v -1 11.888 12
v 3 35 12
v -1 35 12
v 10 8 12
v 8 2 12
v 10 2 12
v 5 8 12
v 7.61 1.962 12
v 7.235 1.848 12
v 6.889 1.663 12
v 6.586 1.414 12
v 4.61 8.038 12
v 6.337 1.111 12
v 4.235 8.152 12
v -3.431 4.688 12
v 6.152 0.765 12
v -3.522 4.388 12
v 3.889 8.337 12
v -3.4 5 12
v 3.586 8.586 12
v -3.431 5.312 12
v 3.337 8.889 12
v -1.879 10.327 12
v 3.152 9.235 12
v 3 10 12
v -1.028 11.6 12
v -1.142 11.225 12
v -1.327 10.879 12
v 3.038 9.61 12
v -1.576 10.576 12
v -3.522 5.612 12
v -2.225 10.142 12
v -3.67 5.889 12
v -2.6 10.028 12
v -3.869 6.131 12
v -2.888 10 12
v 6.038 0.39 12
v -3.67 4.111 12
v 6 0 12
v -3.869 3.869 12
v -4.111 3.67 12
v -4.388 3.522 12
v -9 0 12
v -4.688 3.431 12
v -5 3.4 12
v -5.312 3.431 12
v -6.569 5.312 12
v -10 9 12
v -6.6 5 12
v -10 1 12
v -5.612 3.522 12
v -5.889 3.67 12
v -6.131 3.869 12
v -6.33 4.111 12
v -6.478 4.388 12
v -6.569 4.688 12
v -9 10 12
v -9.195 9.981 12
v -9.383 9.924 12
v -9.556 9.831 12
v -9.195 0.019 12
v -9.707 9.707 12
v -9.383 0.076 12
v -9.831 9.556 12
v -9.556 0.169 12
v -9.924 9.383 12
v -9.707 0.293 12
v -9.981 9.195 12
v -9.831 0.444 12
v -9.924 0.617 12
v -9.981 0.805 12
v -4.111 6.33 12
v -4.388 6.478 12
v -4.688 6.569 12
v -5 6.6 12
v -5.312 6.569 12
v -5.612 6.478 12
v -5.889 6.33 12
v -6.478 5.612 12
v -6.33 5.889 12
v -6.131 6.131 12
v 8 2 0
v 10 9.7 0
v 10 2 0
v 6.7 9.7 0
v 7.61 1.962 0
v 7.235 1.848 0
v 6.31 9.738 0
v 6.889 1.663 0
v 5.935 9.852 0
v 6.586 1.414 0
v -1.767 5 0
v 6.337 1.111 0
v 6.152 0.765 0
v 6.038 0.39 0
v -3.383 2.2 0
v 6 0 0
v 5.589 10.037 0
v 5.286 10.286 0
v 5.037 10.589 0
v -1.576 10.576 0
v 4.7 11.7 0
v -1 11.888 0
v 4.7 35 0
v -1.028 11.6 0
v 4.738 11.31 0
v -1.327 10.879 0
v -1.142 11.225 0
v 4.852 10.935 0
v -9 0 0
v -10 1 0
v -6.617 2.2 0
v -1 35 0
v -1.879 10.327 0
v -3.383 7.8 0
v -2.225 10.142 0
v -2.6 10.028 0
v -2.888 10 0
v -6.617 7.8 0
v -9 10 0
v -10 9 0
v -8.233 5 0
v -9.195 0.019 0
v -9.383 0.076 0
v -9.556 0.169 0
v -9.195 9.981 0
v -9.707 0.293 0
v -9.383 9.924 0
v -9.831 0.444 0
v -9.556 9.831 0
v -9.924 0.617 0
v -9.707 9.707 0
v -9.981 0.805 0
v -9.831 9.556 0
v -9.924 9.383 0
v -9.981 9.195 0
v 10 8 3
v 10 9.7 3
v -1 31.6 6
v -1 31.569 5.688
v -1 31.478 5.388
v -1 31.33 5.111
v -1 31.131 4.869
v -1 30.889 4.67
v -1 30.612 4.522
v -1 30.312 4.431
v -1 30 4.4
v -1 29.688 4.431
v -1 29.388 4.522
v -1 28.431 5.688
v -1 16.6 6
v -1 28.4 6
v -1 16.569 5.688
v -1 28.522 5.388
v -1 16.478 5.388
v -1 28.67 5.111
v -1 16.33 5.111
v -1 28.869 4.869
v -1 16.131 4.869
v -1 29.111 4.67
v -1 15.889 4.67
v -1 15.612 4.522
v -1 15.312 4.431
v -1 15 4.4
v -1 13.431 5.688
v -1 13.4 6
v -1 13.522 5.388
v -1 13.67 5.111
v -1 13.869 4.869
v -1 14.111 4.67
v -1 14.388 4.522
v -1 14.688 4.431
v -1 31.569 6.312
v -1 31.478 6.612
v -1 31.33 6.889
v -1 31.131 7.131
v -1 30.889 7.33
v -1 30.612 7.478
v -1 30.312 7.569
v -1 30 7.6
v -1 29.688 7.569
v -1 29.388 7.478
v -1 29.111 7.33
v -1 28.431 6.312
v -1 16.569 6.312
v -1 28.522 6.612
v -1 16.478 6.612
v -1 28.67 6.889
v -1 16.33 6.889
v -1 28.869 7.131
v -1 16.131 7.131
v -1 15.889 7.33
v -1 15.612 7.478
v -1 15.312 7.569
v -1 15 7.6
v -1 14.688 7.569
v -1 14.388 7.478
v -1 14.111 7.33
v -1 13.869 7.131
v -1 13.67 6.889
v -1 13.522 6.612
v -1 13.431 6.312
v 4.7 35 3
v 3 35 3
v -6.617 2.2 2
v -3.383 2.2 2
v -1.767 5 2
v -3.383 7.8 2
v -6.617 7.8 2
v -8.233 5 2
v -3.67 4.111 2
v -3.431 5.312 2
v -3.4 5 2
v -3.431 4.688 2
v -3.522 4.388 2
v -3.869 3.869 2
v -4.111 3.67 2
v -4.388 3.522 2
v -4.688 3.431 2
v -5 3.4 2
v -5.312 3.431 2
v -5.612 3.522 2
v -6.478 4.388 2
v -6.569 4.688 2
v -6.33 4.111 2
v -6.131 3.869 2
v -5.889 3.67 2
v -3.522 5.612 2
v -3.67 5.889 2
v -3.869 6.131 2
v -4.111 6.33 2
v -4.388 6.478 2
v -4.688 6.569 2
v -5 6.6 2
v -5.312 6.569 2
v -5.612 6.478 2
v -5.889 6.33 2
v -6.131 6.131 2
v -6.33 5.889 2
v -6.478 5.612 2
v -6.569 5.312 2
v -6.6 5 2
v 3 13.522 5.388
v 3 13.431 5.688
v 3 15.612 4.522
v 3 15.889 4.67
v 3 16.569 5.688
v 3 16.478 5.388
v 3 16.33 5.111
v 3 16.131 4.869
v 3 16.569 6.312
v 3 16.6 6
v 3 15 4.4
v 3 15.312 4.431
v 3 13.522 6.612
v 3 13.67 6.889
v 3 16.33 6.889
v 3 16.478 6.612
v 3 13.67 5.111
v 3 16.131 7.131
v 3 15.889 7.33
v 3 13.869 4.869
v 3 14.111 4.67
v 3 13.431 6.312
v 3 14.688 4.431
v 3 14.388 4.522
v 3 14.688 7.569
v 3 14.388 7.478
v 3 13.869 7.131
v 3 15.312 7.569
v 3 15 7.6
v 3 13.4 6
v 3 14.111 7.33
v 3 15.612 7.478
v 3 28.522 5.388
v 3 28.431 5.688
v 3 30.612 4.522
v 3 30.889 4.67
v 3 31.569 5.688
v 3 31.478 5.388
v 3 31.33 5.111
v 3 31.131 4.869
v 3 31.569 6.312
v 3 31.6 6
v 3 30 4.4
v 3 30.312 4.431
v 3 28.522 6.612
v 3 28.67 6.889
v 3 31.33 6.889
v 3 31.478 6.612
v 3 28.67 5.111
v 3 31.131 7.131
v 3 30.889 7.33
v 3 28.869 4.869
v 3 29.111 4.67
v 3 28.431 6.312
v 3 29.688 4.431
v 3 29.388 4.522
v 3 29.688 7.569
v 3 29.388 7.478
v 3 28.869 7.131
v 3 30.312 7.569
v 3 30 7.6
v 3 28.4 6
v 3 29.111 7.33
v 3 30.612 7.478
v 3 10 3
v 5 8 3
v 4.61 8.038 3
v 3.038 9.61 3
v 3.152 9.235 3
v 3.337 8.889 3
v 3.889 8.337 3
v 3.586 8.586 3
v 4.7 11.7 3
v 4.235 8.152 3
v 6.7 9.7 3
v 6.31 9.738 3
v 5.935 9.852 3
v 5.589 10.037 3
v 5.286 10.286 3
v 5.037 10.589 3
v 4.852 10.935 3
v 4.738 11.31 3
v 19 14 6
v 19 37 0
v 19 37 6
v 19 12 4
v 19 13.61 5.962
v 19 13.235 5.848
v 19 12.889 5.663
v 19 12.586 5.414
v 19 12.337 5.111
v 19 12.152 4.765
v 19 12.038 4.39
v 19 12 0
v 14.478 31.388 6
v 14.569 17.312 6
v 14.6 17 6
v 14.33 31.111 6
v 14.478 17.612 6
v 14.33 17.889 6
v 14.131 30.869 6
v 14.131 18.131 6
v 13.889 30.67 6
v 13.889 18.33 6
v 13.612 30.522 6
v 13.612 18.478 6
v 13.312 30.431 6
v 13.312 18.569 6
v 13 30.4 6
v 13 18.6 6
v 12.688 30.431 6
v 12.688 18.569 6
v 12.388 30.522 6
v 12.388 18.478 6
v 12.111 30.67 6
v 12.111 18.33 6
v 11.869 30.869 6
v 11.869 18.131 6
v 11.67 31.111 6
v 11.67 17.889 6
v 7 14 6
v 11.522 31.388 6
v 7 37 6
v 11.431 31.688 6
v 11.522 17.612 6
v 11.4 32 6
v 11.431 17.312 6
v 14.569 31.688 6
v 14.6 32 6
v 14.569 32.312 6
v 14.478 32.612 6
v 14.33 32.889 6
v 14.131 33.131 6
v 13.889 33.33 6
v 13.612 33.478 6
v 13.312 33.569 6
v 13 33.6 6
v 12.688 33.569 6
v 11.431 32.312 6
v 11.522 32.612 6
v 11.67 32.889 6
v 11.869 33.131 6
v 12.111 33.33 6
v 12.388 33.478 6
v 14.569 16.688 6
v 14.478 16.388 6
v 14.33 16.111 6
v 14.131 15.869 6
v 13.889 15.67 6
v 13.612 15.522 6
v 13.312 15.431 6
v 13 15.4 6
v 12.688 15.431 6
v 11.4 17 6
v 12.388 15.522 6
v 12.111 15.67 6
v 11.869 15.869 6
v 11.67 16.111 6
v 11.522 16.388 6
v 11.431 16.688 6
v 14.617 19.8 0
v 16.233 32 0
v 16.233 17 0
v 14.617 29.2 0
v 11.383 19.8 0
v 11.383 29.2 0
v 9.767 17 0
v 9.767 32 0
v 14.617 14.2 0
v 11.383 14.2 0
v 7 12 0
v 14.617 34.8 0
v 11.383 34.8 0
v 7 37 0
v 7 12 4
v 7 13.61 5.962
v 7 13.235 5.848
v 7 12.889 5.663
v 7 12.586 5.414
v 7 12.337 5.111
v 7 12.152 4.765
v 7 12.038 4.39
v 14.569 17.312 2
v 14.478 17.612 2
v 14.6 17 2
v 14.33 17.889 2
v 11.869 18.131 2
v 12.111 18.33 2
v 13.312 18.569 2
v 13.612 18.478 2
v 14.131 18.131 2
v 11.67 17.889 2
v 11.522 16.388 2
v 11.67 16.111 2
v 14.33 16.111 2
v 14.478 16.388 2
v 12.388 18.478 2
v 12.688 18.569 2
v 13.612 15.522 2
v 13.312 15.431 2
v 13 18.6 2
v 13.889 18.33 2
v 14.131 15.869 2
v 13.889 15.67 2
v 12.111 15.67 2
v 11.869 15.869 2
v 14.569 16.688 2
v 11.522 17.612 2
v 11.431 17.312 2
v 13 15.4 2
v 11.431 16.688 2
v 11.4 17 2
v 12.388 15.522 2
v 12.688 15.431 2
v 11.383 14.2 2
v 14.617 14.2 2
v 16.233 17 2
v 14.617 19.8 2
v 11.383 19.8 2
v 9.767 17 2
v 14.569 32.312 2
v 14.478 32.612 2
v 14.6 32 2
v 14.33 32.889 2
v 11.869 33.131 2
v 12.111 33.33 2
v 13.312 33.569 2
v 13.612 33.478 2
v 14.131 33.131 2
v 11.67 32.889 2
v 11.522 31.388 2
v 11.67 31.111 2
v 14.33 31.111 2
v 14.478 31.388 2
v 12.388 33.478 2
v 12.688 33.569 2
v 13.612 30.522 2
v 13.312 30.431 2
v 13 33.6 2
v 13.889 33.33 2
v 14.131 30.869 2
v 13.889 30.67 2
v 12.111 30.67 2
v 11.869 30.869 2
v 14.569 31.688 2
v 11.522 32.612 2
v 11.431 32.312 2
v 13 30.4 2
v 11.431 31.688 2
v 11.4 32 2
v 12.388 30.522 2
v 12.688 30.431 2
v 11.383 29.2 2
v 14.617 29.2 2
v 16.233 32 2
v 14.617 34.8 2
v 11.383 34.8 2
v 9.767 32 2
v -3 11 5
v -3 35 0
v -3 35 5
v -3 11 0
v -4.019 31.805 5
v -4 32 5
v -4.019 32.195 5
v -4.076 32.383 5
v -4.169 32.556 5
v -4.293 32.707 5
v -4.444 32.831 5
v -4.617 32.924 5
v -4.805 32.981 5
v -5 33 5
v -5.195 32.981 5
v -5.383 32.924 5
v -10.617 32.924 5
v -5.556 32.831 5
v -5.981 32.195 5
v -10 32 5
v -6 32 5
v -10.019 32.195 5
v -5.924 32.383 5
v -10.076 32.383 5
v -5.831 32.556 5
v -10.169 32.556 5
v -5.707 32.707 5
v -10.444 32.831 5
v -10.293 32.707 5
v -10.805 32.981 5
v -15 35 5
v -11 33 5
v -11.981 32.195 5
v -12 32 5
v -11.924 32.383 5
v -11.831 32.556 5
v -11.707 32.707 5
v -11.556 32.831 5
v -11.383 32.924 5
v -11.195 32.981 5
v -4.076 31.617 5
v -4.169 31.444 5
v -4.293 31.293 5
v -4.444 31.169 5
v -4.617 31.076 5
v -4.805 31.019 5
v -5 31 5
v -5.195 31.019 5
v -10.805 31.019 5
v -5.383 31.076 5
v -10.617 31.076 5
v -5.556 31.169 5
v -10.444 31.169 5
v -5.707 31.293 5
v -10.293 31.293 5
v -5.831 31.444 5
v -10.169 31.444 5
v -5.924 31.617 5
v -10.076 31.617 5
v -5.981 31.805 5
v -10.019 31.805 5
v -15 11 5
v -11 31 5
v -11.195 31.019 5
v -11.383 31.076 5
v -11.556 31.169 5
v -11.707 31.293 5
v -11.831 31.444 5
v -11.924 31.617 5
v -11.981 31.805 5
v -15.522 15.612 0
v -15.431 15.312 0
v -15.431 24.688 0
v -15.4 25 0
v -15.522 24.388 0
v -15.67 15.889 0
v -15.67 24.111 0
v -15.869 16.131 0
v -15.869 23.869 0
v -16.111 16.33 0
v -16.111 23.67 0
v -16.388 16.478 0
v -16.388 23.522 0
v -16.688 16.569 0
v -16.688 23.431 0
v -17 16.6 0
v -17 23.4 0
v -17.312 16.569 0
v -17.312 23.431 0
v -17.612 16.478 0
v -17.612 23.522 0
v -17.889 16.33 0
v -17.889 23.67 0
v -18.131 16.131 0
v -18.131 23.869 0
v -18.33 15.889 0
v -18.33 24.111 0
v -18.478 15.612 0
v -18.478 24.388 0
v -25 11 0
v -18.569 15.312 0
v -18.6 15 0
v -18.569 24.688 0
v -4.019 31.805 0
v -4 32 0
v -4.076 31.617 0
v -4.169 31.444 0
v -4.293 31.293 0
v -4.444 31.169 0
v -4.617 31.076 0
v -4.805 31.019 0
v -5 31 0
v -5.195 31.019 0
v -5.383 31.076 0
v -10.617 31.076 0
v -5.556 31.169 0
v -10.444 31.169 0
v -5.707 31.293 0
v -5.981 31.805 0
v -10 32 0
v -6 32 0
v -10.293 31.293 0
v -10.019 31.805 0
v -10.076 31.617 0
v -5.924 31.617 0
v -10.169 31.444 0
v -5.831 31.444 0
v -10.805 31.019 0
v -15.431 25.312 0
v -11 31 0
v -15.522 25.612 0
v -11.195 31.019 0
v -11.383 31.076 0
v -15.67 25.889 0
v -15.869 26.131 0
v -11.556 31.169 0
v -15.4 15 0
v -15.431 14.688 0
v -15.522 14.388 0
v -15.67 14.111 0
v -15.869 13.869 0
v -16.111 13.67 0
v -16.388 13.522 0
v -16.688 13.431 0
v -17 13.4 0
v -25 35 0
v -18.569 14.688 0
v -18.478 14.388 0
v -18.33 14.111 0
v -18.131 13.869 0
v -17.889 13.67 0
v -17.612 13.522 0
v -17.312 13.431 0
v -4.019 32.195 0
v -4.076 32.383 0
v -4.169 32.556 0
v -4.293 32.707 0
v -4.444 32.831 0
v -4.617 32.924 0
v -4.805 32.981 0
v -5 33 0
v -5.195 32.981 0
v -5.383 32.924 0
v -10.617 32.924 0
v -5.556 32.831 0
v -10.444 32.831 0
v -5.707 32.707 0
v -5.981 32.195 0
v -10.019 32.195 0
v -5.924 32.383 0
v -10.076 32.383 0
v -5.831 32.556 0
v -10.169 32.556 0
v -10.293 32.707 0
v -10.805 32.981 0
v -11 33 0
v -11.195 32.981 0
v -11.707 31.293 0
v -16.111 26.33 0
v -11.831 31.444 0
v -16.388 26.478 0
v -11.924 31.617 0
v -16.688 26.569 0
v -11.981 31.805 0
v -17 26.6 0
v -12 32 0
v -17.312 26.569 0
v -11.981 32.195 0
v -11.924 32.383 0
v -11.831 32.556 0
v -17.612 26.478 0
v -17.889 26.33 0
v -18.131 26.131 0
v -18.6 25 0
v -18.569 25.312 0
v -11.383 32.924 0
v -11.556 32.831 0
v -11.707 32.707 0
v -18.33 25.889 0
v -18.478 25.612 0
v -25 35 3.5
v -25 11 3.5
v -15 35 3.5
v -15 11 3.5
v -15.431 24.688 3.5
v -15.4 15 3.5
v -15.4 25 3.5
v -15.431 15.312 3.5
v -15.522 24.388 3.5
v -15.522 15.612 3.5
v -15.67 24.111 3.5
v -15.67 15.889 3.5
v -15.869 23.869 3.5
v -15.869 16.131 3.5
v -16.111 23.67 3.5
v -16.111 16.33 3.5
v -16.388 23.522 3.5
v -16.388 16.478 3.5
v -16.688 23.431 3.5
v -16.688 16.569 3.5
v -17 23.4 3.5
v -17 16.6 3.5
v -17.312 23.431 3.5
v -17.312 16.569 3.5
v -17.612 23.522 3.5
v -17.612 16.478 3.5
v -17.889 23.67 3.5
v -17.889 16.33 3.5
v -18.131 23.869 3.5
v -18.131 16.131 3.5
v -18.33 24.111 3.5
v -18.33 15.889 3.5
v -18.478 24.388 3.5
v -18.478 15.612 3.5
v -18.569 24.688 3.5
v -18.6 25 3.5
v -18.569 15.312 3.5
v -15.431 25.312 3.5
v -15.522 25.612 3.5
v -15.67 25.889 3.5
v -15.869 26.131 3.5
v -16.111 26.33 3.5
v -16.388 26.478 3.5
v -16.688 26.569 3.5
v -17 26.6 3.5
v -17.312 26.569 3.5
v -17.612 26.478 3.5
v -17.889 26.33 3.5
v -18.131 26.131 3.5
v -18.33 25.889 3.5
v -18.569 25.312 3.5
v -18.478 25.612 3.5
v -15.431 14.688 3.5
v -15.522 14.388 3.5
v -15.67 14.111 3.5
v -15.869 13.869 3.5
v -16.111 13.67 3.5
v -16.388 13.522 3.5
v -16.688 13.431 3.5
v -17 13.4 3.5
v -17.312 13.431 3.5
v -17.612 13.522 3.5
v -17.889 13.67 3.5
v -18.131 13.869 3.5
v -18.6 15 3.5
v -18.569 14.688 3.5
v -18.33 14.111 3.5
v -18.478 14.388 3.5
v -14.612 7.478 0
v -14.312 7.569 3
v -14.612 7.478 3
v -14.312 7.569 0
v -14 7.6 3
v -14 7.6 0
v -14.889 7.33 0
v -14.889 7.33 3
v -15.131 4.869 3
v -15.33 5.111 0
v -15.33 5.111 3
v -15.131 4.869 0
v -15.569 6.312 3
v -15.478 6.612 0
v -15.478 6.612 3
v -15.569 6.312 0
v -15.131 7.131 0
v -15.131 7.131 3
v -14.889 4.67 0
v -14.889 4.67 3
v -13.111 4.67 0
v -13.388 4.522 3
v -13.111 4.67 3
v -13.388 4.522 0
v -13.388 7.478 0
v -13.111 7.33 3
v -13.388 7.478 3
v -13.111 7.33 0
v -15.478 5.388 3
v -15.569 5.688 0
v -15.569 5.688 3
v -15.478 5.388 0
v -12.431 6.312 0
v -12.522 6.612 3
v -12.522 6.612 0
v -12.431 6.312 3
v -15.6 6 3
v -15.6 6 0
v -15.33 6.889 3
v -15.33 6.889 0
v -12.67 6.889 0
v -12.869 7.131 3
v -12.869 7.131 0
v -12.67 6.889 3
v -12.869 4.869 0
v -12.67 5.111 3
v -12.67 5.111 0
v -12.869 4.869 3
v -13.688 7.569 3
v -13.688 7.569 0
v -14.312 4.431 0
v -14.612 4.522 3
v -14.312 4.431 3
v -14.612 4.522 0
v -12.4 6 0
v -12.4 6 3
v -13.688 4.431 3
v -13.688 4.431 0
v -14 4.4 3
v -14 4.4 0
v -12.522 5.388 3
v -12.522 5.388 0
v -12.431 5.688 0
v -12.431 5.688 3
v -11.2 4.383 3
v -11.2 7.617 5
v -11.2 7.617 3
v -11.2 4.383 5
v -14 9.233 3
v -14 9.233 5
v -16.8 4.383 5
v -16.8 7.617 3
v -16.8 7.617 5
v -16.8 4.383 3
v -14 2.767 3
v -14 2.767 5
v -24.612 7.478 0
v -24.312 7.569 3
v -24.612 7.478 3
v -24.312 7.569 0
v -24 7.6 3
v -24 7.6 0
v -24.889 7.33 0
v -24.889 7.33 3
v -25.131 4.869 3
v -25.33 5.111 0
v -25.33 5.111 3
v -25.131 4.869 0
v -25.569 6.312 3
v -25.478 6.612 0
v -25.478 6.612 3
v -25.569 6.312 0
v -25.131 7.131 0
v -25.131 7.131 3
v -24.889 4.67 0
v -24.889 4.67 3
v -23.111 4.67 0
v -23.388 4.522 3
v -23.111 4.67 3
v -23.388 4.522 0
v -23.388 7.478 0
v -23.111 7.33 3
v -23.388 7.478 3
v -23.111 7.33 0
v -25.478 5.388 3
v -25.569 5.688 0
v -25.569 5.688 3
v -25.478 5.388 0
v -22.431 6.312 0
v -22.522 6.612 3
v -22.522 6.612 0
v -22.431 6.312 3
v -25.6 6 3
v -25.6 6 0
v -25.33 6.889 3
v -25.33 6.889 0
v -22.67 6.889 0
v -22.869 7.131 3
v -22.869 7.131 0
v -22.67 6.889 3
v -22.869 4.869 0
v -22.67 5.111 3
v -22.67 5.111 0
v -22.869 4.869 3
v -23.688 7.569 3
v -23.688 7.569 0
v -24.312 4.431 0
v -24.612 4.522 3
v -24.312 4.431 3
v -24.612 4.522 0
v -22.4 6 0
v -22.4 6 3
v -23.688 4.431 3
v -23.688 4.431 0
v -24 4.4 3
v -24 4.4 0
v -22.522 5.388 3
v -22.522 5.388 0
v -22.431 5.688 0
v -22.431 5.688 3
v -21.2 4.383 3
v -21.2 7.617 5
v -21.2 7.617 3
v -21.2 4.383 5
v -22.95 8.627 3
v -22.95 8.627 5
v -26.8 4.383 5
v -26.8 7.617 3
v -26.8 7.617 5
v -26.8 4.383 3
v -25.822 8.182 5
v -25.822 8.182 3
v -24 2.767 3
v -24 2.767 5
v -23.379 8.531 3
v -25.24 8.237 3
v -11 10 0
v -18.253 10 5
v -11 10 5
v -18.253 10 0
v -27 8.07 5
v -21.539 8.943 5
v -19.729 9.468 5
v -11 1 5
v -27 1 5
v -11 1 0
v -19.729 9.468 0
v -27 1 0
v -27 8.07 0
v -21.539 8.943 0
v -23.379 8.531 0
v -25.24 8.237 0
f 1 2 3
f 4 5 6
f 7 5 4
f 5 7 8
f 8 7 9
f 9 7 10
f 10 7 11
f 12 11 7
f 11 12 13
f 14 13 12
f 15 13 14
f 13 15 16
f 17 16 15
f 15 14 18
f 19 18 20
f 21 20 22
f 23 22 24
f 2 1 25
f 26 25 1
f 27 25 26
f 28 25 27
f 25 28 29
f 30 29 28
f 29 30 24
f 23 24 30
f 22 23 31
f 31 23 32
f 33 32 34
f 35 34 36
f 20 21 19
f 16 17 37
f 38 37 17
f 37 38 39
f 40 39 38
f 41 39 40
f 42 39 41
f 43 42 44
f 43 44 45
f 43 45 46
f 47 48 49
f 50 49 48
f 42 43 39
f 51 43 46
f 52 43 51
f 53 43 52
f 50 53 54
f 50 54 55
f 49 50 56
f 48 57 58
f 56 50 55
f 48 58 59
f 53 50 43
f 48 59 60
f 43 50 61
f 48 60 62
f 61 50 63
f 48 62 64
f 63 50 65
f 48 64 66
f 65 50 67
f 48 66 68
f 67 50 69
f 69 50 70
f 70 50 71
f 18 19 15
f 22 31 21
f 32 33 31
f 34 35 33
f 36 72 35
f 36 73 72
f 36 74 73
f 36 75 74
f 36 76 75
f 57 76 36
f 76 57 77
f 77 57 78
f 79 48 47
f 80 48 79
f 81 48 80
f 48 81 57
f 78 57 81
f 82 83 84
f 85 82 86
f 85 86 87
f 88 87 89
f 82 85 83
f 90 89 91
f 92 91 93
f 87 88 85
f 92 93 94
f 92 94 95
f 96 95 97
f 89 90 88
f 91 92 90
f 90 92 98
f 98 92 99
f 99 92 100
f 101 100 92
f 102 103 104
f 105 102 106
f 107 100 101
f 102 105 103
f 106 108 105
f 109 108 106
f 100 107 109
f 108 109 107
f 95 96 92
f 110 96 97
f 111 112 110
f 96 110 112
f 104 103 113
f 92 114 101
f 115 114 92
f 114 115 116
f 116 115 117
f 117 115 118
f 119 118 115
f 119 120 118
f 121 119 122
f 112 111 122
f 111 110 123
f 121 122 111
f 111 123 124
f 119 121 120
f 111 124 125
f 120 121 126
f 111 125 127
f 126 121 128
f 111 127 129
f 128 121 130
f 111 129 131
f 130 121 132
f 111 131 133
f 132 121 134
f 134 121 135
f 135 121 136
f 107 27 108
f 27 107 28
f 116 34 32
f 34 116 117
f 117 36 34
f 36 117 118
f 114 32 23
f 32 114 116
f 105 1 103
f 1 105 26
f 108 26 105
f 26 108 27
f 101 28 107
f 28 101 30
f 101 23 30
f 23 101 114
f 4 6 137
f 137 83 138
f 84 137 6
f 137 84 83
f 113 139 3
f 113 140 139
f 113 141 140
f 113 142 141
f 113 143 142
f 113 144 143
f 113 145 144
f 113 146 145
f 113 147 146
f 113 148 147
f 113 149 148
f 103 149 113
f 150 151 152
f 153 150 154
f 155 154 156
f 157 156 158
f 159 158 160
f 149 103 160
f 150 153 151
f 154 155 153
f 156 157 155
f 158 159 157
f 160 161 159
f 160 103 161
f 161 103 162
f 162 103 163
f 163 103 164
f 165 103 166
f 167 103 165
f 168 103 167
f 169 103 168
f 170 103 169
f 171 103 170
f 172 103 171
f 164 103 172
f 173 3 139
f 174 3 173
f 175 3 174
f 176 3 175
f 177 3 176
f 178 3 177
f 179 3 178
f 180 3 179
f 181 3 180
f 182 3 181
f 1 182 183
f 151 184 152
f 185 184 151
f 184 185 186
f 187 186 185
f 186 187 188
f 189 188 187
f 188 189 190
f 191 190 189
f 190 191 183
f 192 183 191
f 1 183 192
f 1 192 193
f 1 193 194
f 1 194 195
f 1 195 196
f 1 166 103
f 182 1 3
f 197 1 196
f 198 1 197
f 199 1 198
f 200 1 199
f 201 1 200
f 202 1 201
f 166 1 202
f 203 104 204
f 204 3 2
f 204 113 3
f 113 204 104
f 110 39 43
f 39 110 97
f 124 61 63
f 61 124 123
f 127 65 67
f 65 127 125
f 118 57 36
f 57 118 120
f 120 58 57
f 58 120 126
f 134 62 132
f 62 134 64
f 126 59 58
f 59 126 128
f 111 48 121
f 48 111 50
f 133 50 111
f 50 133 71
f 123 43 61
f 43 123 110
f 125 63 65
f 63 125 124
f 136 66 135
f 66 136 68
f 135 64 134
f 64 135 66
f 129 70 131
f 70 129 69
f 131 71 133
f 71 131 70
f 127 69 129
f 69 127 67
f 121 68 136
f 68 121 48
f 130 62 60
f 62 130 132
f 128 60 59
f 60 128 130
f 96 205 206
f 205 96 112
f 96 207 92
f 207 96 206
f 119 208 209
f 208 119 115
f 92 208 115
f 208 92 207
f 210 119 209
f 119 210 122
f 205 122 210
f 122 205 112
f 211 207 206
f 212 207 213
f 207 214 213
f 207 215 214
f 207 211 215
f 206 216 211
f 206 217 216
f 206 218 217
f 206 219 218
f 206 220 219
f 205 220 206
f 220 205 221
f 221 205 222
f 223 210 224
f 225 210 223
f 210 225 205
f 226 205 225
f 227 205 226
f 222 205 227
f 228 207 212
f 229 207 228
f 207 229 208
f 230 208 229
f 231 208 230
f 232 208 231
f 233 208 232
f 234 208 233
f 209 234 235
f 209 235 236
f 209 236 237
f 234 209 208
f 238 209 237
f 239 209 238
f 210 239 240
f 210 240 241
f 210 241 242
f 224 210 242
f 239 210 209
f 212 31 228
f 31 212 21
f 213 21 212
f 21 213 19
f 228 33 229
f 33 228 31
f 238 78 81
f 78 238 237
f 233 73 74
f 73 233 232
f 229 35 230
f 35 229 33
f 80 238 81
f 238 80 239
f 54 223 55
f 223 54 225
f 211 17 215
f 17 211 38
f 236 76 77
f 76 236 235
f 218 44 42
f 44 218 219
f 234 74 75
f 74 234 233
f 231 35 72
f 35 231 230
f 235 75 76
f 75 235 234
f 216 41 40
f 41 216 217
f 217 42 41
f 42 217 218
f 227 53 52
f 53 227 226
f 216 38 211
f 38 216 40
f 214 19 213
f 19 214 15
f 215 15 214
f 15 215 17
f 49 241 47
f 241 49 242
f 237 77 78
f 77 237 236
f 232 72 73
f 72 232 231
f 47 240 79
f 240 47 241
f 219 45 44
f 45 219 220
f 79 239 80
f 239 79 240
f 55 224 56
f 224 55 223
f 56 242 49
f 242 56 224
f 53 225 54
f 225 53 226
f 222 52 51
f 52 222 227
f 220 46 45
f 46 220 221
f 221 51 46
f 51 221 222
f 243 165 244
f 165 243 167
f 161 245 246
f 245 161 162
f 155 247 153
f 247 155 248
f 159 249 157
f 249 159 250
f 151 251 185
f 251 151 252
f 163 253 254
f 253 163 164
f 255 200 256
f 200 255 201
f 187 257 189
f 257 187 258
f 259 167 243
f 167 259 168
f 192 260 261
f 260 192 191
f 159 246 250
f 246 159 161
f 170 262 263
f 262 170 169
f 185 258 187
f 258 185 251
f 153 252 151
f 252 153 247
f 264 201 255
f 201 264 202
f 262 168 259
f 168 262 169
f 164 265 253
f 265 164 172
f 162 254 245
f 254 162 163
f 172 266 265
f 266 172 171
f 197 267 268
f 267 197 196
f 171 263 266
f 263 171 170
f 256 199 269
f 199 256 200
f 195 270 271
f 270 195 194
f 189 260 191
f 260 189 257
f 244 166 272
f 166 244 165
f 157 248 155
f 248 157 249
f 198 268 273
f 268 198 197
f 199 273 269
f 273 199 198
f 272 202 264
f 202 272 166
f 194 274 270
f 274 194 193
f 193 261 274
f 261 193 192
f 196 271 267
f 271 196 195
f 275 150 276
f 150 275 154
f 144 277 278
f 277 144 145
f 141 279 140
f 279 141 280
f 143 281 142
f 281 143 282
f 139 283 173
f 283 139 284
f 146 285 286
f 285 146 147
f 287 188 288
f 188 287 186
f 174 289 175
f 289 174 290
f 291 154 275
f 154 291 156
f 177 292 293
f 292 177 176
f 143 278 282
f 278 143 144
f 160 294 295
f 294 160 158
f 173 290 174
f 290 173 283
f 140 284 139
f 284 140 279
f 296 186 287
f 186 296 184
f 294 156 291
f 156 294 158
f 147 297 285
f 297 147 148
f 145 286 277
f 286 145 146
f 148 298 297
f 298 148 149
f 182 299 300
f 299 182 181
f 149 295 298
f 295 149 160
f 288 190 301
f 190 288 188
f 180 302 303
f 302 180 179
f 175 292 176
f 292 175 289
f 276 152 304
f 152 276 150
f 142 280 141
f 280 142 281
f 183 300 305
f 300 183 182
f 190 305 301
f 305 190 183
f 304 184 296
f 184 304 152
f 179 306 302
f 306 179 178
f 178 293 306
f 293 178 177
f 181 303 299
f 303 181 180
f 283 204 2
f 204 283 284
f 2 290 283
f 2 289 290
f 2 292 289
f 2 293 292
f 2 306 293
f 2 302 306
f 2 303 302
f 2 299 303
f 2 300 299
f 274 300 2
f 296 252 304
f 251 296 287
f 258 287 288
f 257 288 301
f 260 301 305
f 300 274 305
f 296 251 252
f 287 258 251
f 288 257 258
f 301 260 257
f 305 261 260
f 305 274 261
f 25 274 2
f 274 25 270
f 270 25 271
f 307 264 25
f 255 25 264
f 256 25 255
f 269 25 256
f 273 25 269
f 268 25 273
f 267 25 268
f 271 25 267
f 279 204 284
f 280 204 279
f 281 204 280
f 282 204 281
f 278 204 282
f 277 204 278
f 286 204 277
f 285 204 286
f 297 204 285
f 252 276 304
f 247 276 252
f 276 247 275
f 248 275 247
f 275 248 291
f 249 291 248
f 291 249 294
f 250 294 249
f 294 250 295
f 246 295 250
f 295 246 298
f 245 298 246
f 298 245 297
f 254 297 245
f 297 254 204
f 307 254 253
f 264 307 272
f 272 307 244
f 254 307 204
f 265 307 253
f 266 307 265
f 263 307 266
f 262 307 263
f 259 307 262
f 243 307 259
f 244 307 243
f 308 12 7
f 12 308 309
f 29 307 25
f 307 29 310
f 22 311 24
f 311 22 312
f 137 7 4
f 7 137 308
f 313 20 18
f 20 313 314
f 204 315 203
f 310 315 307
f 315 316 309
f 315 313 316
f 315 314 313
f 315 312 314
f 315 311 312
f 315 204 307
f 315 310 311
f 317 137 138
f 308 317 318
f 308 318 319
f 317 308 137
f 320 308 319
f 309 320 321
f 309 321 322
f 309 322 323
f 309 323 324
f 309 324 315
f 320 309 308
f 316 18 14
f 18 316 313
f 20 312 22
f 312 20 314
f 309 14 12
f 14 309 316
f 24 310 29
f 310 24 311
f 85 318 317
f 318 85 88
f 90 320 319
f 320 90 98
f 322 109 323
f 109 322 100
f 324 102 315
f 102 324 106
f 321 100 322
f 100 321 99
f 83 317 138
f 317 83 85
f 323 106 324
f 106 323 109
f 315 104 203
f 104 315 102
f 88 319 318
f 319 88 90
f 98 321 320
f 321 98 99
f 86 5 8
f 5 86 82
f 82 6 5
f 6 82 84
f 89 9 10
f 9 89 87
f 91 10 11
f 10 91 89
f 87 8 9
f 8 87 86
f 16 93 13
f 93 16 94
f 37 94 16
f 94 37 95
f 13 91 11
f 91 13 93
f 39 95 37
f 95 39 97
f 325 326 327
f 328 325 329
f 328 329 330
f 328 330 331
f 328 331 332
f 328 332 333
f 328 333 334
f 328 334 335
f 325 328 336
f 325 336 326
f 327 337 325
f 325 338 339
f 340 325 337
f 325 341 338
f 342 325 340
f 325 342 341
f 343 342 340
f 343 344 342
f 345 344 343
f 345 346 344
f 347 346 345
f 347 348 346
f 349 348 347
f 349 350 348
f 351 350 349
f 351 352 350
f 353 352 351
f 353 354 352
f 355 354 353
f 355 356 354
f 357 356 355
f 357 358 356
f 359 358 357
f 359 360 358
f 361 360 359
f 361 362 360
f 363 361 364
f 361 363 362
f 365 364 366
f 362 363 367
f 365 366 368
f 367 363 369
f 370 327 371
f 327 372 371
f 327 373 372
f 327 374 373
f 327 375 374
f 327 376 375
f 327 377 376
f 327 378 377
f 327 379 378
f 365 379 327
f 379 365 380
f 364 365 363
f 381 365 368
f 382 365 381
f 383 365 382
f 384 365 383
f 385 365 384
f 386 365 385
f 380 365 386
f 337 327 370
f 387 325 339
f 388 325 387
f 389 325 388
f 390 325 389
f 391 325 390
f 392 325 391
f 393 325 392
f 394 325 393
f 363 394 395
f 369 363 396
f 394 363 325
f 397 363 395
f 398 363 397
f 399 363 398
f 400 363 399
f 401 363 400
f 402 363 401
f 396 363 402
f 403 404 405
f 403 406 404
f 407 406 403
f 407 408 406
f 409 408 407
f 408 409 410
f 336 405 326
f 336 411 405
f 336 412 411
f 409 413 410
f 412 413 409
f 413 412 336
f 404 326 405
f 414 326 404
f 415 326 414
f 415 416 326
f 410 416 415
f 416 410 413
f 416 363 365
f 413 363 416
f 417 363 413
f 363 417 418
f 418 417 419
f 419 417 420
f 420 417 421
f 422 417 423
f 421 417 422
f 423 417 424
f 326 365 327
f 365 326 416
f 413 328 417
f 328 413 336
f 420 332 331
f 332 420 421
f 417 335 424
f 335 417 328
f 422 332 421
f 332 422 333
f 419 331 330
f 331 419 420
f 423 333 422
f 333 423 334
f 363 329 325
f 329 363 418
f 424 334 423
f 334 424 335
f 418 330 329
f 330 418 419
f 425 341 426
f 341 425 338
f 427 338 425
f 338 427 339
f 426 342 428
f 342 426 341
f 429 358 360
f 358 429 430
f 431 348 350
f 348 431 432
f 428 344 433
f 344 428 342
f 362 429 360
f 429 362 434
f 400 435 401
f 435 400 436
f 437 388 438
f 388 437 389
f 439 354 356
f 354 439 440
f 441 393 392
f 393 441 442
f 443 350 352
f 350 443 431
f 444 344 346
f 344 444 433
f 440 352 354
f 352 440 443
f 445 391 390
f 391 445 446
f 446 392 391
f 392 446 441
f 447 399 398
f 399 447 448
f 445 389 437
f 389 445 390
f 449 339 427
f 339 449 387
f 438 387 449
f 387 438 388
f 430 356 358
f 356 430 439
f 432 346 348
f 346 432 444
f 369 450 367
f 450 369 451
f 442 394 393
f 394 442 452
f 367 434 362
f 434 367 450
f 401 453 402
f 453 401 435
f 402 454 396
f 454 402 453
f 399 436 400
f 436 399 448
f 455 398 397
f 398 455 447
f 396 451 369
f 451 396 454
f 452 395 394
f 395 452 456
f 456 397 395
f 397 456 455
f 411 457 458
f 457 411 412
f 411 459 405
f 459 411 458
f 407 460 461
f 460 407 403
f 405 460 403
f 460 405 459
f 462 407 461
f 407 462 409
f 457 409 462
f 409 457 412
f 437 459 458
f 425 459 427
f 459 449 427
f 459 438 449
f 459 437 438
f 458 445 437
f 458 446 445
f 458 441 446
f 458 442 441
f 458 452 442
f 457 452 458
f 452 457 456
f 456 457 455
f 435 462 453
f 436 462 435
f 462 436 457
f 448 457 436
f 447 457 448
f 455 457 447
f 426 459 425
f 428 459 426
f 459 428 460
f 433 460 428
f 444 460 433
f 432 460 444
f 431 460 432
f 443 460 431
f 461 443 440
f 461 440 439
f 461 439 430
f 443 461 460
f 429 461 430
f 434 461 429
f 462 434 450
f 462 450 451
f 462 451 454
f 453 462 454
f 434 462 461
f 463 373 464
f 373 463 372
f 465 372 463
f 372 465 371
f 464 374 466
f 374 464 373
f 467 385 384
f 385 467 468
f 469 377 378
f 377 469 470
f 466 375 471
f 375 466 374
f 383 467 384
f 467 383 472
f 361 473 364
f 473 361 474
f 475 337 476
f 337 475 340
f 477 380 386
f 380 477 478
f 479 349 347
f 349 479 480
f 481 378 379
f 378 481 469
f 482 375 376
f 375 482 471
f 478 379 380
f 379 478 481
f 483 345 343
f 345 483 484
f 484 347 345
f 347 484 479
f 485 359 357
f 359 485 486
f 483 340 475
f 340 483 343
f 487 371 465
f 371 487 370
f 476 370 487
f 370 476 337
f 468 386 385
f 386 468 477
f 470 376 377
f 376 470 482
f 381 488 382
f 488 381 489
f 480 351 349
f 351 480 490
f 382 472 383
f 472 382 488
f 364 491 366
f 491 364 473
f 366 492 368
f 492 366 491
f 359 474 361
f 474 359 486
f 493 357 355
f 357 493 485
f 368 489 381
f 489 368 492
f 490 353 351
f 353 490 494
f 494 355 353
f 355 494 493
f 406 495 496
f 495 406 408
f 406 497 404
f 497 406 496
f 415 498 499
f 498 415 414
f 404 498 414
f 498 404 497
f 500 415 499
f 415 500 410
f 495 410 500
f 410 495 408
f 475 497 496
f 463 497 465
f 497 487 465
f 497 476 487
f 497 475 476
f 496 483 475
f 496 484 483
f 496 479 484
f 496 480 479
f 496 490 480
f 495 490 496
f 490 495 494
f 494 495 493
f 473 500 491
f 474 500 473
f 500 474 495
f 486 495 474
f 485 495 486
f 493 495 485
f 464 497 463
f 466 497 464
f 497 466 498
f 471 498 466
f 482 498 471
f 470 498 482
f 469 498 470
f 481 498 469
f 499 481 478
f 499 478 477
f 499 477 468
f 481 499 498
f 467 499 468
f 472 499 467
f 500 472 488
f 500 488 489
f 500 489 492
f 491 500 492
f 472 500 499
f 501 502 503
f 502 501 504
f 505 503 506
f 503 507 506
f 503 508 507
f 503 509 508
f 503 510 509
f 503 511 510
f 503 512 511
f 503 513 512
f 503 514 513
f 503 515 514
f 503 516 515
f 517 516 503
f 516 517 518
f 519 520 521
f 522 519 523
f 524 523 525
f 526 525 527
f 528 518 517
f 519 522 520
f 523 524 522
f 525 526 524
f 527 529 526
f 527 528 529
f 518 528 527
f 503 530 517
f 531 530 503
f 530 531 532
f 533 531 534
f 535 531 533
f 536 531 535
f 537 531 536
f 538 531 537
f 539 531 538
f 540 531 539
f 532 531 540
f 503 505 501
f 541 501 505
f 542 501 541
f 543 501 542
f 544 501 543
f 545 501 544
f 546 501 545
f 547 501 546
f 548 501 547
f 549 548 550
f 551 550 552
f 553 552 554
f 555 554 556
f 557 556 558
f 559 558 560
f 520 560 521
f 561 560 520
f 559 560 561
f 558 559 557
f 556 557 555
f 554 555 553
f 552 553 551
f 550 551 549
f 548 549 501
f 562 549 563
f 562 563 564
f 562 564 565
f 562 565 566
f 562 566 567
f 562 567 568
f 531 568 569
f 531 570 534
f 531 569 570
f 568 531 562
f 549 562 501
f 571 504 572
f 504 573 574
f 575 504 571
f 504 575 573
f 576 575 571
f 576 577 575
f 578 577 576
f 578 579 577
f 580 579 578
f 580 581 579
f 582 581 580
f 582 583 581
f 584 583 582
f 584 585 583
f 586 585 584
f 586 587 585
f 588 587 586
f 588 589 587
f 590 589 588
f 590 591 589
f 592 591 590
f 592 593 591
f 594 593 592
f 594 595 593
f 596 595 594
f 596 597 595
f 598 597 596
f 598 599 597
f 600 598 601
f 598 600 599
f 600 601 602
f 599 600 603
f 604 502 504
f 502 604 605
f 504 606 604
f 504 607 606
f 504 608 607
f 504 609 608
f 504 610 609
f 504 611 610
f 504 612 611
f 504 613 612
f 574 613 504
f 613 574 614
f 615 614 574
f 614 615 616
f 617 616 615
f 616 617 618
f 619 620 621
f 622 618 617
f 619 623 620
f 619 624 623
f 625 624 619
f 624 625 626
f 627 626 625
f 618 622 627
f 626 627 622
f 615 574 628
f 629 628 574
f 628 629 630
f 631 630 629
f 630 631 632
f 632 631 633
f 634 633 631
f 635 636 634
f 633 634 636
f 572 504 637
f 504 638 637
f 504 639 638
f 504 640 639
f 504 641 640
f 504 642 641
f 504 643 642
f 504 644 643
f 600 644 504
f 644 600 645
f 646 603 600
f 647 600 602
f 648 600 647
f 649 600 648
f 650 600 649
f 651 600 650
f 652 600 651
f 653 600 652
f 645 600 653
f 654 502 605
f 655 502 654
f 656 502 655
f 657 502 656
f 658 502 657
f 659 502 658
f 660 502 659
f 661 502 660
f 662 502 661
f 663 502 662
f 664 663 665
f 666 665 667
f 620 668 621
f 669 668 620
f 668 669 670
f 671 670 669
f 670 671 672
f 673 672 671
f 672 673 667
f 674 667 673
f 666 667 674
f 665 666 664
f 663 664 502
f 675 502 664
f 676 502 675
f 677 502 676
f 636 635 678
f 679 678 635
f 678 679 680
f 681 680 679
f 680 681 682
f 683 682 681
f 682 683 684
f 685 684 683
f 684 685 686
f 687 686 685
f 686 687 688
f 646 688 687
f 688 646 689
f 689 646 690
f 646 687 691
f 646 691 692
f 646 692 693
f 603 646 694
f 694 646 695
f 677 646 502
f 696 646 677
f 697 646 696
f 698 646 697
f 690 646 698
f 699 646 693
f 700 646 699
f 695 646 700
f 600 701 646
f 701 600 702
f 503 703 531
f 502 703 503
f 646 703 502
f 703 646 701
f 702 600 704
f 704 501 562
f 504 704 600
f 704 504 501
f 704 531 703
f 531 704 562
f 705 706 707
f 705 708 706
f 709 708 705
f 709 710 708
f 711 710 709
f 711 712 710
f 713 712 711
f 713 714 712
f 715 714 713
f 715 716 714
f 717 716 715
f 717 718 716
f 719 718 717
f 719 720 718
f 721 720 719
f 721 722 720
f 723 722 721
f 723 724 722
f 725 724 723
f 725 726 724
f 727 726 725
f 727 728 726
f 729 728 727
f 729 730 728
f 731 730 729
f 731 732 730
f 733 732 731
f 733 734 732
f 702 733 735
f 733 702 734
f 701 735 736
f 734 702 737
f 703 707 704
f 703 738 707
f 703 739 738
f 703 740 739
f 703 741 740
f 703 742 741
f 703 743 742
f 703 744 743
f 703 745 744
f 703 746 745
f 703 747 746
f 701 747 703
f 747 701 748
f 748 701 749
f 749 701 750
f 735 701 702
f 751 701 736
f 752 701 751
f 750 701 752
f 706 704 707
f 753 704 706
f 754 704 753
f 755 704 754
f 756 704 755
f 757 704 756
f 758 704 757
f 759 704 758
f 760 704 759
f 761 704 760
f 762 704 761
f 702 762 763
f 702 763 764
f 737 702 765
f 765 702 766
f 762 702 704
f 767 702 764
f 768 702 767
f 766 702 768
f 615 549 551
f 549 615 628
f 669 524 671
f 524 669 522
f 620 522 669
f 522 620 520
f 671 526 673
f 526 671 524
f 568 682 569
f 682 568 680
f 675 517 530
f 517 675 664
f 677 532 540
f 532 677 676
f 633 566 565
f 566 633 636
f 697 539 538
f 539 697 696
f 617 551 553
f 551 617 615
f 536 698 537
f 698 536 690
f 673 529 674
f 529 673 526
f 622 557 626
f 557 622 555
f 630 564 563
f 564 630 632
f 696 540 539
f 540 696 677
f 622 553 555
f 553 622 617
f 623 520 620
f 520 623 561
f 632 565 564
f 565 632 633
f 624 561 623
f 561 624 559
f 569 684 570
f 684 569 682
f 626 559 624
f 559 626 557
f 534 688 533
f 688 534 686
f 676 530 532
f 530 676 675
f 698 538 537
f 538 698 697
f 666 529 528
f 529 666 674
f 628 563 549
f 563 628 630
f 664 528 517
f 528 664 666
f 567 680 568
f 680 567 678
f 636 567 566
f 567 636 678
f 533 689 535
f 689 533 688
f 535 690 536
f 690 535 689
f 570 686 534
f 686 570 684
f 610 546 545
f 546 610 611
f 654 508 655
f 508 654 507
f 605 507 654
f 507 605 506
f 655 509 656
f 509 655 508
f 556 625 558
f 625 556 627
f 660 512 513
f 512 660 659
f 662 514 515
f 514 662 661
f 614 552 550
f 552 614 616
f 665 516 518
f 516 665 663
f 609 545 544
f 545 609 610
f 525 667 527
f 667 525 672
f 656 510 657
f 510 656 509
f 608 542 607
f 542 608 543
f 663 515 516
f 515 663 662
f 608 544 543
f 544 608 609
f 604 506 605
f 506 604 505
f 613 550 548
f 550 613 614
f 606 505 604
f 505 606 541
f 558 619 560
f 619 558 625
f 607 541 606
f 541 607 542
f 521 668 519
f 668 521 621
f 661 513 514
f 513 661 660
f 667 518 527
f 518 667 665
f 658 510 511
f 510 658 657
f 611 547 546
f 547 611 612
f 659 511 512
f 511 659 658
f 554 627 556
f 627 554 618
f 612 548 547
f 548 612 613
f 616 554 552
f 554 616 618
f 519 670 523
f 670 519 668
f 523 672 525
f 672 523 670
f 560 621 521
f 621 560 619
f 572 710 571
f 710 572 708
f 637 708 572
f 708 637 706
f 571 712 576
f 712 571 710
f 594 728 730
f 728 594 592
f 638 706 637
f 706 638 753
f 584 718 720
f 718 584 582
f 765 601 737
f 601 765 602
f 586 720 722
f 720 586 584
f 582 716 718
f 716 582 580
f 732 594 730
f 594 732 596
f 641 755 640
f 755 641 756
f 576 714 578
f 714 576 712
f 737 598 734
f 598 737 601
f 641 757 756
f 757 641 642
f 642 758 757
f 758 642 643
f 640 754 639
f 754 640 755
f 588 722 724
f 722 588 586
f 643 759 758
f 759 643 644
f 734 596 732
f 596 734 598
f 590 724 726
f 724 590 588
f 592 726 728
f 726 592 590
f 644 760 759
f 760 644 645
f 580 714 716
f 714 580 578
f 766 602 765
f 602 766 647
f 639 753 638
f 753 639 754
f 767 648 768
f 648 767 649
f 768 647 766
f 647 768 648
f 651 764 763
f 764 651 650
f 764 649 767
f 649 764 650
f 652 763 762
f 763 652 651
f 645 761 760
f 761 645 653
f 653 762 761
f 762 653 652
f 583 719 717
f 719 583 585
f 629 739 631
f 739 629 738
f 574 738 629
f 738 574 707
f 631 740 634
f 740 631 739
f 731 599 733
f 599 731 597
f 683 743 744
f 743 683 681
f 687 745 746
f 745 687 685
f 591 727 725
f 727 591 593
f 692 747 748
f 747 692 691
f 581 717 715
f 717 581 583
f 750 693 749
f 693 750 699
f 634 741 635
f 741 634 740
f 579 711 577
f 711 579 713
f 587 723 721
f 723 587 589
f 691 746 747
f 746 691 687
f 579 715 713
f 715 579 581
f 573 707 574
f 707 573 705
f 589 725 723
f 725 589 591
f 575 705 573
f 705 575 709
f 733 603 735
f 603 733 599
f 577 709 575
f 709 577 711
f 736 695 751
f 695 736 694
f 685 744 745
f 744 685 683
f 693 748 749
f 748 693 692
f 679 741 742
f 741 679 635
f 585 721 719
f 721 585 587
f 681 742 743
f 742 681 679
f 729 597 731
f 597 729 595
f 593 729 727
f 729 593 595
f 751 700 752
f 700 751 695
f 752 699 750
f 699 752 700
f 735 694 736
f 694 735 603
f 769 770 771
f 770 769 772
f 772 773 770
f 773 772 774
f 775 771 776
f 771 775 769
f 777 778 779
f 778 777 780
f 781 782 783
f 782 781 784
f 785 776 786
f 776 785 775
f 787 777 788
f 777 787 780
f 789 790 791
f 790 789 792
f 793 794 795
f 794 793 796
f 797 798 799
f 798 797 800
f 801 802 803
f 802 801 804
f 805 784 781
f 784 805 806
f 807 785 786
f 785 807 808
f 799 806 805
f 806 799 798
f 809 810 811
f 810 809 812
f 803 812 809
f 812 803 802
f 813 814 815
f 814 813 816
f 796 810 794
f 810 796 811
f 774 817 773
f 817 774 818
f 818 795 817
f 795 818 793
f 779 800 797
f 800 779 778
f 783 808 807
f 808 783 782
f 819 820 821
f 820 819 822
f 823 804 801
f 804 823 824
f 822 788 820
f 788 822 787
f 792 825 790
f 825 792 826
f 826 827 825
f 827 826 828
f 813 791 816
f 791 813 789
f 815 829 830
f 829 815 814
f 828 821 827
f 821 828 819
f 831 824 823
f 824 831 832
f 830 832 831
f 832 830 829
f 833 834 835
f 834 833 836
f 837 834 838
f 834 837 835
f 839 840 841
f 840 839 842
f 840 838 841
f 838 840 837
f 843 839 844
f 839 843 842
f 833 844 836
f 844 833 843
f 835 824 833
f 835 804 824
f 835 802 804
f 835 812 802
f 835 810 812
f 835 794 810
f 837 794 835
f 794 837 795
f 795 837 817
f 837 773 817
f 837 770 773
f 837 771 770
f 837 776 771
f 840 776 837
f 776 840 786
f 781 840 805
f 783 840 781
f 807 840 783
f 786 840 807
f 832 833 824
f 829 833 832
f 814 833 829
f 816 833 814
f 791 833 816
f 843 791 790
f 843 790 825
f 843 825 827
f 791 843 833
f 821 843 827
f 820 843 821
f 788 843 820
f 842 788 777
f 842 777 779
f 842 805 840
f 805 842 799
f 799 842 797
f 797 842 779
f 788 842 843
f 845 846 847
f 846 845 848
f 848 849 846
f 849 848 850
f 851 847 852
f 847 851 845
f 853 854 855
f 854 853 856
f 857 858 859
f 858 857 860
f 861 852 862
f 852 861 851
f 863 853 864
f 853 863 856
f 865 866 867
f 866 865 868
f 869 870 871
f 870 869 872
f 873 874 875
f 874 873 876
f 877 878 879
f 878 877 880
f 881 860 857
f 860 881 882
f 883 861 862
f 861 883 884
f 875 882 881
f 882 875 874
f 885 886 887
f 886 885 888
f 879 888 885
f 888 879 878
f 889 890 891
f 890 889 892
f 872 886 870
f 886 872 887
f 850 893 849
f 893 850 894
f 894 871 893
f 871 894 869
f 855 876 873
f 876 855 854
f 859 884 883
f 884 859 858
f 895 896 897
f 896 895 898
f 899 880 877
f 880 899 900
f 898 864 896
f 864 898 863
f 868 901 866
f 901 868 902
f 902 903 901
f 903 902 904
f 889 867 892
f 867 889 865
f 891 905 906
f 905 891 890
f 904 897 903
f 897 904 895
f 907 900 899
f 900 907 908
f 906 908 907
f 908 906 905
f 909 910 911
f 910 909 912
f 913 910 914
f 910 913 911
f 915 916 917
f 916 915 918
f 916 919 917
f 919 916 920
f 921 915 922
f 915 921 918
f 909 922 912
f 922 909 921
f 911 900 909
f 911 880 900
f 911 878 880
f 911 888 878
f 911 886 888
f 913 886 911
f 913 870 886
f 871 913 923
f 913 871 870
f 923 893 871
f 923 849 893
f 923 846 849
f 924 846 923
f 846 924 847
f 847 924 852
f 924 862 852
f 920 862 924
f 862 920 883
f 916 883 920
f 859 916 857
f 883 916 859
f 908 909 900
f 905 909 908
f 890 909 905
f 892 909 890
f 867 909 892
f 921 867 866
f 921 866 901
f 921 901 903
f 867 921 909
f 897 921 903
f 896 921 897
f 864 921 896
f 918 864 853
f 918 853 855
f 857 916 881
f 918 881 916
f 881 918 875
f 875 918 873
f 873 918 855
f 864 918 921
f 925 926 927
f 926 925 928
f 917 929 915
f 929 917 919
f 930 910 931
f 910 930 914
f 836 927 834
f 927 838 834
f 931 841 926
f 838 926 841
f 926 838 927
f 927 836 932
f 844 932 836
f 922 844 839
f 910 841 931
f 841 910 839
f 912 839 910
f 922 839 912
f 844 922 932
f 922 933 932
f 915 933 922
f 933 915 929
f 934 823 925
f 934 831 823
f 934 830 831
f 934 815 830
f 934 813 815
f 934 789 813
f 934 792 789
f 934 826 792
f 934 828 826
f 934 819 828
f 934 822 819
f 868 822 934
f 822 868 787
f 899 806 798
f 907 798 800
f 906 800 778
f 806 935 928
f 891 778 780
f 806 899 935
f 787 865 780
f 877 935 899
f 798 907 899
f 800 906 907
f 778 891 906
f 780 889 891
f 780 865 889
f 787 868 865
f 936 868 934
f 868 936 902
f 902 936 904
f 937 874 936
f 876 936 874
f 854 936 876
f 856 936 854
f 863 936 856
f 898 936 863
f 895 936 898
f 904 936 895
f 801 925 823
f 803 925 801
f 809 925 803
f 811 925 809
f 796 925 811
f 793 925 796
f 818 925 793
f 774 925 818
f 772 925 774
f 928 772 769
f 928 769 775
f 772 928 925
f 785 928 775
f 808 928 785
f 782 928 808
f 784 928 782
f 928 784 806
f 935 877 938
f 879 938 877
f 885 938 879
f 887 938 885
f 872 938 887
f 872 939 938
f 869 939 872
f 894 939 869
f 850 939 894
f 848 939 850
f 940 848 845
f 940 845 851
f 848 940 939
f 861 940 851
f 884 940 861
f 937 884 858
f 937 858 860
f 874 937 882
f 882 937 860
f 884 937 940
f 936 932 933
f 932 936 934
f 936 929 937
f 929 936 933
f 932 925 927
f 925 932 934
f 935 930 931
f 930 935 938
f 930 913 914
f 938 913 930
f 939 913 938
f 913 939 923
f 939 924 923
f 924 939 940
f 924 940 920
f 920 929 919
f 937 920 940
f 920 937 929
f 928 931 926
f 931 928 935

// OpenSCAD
g3mm = 3.2;
g2mm = 2.0;

gMicroswitchHoleSpacing = 6.0;
gSideClampHole1 = 0;
gSideClampHole2 = 10;

gTopClampY1 = 15;
gTopClampY2 = 30;
gClampOffset = 10;

module NutTrap(x,h=100) {
    cylinder(d=x/0.866,h=h,$fn=6);
}
module Fillet(r,h=100) {
    difference() {
        cube([r,r,h]);
        translate([0,0,-1]) cylinder(r=r,h=h+2);
    }
}

/* Side clamp, in two parts */

module SideBody() {
    difference() {
        translate([0,-4,0]) cube([22,24,5]);
        translate([-1,-5,3.5]) cube([11,27,5]);
        translate([14,17,-1]) cylinder(d=g2mm,h=100,$fn=32);
        translate([14+gMicroswitchHoleSpacing,17,-1]) cylinder(d=g2mm,h=100,$fn=32);
        translate([8,gSideClampHole1,-1]) cylinder(d=g3mm,h=100,$fn=32);
        translate([8,gSideClampHole2,-1]) cylinder(d=g3mm,h=100,$fn=32);
    }
    
}

module SideClamp() {
    difference() {
        translate([3,-3,0]) cube([9,16,5]);
        translate([30+10,15,-1]) cylinder(r=30,h=100,$fn=100);
        translate([8,gSideClampHole1,-1]) union() {
            cylinder(d=g3mm,h=100,$fn=32);
            translate([0,0,4]) NutTrap(5.6);
        }
        translate([8,gSideClampHole2,-1]) {
            cylinder(d=g3mm,h=100,$fn=32);
            translate([0,0,4]) NutTrap(5.6);
        }
    }
}


/* Top clamp, in two parts */

module TopBody() {
    difference() {
        union() {
            translate([-1,0,0]) cube([11,35,12]);
            /* thing adjustment screw goes on */
            hull() for(x=[-9,0])
                for(y=[1,9])
                    translate([x,y]) cylinder(r=1,h=12);
            translate([-2.99,11.99,0]) rotate([0,0,-90]) Fillet(2,12);
        }
        hull() {
            for(x=[5,10])
                for(y=[10,50])
                    translate([x,y,3])
                    cylinder(r=2,h=100);
        }
        hull() {
            for(x=[5+1.7,10])
                for(y=[10+1.7,50])
                    translate([x,y,-1])
                    cylinder(r=2,h=100);
        }
        /* adjustment screw */
        translate([-5,5,-1]) {
            NutTrap(5.6,3);
            cylinder(d=3.2,h=200);
        }
        /* notch for frame */
        hull() {
            for(x=[8,20])
            translate([x,0,-1]) cylinder(r=2,h=100);
        }
        /* clamp holes */
        for(y=[gTopClampY1,gTopClampY2])
            translate([-10,y,6])
            rotate([0,90,0]) cylinder(d=3.2,h=100);
    }
}

module TopClamp() {
    difference() {
        intersection() {
            cube([12,25,6]);
            hull() {
                translate([0,2,4]) rotate([0,90,0]) cylinder(r=2,h=100);
                translate([0,50,4]) rotate([0,90,0]) cylinder(r=2,h=100);
                translate([0,50,-50]) rotate([0,90,0]) cylinder(r=2,h=100);
                translate([0,2,-50]) rotate([0,90,0]) cylinder(r=2,h=100);
            }
        }
        /* clamp holes */
        for(y=[gTopClampY1,gTopClampY2])
            translate([6,y-gClampOffset,-1]) {
        
            cylinder(d=3.2,h=100);
                NutTrap(5.6,3);
            }
        
    }
}

TopBody($fn=32);
/* to visualize together */
/* translate([11,gClampOffset,0]) rotate([0,-90,0]) Clamper($fn=32); */
/* for printing */
translate([7,gClampOffset+2,0]) TopClamp($fn=32);

translate([-25,15,0]) SideBody();
translate([-14,-2,0]) rotate([0,0,90]) SideClamp();
